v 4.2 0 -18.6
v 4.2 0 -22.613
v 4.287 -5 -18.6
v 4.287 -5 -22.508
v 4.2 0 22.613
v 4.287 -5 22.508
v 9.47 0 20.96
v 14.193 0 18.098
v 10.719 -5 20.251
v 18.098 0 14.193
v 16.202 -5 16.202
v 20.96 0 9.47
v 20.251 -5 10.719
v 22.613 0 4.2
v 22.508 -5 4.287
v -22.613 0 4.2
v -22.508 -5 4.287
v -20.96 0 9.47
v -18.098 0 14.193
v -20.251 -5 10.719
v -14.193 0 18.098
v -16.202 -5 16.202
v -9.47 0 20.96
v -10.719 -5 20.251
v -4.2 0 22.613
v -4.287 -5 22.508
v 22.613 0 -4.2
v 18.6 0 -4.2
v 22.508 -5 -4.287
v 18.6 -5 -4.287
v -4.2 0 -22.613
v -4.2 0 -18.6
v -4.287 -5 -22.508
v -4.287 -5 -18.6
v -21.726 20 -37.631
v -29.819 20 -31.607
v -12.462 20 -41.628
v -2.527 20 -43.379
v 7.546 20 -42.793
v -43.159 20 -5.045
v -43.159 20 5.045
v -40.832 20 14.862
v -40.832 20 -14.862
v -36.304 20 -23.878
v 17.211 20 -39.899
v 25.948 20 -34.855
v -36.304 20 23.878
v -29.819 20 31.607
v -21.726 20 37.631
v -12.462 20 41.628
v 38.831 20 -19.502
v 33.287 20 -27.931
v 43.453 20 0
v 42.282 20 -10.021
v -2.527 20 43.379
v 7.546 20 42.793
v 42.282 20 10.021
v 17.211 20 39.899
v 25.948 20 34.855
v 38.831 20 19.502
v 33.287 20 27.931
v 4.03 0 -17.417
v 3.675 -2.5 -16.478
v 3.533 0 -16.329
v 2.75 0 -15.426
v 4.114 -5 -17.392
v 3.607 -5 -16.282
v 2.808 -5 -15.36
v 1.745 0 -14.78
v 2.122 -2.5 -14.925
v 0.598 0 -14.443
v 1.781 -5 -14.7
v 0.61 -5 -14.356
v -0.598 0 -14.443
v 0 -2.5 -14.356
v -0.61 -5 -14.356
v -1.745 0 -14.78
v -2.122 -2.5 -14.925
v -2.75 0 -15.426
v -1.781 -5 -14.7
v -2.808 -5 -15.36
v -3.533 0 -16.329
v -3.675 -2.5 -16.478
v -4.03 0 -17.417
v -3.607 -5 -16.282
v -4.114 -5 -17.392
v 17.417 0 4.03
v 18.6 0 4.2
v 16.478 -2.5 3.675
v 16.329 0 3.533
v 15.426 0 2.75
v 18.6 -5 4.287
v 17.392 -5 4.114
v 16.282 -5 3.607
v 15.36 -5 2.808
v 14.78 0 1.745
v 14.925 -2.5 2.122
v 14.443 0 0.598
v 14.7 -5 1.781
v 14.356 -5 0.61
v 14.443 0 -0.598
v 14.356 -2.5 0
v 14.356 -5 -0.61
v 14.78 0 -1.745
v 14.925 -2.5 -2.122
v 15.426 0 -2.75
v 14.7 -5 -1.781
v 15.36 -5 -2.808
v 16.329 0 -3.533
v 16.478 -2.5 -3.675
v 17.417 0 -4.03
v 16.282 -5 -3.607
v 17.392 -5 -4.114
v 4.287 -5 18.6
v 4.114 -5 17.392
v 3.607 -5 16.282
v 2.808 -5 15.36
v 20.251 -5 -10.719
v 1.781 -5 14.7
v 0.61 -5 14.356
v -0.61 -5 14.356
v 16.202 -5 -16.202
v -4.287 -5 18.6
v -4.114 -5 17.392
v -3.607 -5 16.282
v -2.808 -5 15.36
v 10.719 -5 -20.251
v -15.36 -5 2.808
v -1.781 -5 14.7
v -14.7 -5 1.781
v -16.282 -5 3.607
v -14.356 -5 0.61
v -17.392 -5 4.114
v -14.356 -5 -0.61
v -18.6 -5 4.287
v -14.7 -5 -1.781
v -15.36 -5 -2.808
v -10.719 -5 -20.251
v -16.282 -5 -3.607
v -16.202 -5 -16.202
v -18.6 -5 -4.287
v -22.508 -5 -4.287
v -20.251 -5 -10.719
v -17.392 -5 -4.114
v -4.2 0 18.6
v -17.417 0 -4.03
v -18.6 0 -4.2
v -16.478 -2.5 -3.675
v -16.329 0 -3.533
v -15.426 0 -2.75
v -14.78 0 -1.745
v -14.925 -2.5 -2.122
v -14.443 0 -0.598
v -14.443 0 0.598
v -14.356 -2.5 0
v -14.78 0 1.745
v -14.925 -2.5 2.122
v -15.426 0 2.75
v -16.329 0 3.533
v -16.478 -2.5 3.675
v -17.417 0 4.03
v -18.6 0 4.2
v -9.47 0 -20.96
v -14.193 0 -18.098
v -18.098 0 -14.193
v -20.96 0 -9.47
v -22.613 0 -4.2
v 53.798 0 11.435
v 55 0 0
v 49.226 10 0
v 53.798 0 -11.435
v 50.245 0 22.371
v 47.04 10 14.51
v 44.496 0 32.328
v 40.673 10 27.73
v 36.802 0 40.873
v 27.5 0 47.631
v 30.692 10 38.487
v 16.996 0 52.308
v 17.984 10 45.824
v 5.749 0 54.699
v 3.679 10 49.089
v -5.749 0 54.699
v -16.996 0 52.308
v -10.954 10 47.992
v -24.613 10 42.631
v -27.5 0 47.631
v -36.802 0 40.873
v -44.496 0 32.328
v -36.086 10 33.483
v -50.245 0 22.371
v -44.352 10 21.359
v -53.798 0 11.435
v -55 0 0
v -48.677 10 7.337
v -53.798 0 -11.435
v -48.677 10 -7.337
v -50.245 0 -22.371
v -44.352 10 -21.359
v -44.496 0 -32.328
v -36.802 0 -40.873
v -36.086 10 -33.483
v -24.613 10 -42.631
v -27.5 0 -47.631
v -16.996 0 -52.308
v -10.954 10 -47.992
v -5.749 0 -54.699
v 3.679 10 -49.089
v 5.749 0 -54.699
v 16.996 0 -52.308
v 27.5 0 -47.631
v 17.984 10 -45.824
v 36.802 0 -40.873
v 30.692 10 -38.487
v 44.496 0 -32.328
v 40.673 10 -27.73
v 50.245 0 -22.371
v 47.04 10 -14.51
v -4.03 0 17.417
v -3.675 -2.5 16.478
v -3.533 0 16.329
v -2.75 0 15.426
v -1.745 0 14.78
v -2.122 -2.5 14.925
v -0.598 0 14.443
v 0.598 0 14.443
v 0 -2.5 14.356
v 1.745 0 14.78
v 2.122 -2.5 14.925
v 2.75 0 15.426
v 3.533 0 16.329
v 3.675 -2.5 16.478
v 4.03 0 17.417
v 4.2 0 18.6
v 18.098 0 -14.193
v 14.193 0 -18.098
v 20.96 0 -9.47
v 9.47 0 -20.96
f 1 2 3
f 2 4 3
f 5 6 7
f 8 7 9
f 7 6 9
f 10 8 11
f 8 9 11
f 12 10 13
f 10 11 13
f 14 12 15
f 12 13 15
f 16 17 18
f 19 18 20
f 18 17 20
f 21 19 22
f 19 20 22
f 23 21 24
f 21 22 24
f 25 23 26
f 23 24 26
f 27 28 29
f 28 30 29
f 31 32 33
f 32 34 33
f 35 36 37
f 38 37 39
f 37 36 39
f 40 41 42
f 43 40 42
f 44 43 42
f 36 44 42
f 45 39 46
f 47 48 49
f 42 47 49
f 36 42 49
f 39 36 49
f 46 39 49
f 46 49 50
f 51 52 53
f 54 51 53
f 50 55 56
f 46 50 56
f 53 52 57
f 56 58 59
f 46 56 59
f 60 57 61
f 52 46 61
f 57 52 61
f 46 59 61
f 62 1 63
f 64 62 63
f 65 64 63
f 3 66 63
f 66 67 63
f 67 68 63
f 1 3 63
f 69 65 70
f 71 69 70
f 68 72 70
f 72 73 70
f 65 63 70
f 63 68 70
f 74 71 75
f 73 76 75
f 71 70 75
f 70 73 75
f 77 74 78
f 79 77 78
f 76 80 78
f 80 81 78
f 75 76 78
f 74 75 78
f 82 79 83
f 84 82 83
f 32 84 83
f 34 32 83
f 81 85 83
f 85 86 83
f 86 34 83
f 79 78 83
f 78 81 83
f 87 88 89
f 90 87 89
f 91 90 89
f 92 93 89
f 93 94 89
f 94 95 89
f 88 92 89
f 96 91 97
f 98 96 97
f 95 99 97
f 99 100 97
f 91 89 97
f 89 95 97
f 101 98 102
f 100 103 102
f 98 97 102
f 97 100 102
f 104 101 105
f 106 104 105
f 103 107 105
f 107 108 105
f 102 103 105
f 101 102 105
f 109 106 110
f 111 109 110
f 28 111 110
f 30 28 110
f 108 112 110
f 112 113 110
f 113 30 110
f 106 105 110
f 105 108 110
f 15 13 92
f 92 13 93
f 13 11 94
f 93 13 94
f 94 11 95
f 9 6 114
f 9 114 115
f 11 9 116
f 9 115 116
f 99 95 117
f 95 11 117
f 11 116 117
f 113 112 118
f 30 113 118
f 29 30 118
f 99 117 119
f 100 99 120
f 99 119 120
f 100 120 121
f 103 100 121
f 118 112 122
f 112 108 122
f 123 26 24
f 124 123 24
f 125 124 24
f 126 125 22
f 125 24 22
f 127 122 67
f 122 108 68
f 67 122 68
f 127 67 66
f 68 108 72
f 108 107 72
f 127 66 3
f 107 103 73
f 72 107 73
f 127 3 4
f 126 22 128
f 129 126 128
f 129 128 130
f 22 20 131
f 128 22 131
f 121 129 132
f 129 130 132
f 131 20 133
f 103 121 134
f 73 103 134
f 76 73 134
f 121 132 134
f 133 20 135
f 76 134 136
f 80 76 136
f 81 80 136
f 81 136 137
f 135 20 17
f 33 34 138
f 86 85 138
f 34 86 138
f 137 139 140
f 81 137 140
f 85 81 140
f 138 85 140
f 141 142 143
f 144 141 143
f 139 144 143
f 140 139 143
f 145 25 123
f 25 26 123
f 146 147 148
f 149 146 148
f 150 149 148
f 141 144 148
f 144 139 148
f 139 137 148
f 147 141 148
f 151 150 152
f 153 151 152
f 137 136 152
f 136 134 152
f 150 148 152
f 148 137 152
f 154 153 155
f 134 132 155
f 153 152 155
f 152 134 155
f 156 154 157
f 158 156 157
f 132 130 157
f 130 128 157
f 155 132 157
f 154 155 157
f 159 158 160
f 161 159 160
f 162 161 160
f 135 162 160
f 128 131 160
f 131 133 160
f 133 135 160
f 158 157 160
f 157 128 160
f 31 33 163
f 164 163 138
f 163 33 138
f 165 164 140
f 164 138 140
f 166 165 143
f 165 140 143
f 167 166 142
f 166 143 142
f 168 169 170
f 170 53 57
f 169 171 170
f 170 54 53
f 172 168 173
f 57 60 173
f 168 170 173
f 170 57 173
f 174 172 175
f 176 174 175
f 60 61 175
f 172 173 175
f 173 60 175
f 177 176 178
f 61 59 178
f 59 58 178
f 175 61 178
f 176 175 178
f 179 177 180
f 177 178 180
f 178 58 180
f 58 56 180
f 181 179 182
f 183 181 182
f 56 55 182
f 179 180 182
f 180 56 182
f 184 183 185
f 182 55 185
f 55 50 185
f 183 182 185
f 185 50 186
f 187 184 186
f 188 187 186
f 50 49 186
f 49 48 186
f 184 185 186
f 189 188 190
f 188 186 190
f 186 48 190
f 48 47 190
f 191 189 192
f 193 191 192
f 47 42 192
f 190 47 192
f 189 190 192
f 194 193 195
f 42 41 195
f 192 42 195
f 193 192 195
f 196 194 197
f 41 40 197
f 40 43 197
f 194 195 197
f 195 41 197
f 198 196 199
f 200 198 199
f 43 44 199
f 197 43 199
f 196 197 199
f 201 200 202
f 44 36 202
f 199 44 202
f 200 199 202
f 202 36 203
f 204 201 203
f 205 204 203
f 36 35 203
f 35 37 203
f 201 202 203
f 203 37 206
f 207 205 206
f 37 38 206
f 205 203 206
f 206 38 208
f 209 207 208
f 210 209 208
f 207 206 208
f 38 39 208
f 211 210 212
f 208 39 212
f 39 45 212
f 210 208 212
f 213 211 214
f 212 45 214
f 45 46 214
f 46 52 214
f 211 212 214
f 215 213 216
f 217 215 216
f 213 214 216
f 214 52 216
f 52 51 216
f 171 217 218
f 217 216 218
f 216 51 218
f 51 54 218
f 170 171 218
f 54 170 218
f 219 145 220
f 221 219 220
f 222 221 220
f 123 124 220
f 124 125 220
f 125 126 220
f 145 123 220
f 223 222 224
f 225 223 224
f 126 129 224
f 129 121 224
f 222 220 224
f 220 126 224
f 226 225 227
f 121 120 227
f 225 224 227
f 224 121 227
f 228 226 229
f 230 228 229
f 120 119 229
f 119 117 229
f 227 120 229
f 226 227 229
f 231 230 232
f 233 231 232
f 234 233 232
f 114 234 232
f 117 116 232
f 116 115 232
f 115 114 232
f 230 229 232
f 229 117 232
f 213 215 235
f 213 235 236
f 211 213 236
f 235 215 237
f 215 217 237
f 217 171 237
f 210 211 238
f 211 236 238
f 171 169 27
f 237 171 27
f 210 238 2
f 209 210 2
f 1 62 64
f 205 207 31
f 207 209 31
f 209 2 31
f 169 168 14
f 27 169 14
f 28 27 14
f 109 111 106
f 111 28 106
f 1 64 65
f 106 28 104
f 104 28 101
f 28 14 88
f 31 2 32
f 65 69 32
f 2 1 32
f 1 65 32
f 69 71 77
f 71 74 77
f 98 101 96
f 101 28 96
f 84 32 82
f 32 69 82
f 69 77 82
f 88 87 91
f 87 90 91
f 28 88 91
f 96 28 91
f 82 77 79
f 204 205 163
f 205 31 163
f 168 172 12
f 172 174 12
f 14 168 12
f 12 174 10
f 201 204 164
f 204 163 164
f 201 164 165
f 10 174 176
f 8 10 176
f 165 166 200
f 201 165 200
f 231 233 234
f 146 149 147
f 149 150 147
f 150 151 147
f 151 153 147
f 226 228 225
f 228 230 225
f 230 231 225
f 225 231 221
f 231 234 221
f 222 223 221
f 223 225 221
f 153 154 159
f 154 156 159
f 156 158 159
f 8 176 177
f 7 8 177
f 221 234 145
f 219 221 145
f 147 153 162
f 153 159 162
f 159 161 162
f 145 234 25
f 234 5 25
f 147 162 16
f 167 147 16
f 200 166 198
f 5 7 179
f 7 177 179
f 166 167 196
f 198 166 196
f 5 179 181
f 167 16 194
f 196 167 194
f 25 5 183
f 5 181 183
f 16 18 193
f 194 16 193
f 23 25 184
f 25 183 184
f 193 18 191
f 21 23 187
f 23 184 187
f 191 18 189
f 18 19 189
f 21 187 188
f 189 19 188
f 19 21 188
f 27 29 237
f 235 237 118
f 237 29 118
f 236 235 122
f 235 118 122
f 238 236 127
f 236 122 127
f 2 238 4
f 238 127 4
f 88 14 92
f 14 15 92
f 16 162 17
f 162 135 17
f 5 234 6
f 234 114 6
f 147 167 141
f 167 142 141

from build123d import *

# Parameters (mm, degrees)
BOSS_EXTRUDE1_DEPTH = 5
BOSS_EXTRUDE1_TAPER = 1


with BuildPart() as part:
    # Sketch2 → Boss-Extrude1 (new body)
    with BuildSketch(Plane(origin=(0, 0, 0), x_dir=(1, 0, 0), z_dir=(0, 1, 0))):
        with BuildLine():
            Line((-4.2, 18.6), (-4.2, 22.61327044))
            ThreePointArc((-4.2, 22.61327044), (-16.263455967, 16.263455967), (-22.61327044, 4.2))
            Line((-22.61327044, 4.2), (-18.6, 4.2))
            ThreePointArc((-18.6, 4.2), (-14.4, 0), (-18.6, -4.2))
            Line((-18.6, -4.2), (-22.61327044, -4.2))
            ThreePointArc((-22.61327044, -4.2), (-16.263455967, -16.263455967), (-4.2, -22.61327044))
            Line((-4.2, -22.61327044), (-4.2, -18.6))
            ThreePointArc((-4.2, -18.6), (0, -14.4), (4.2, -18.6))
            Line((4.2, -18.6), (4.2, -22.61327044))
            ThreePointArc((4.2, -22.61327044), (16.263455967, -16.263455967), (22.61327044, -4.2))
            Line((22.61327044, -4.2), (18.6, -4.2))
            ThreePointArc((18.6, -4.2), (14.4, 0), (18.6, 4.2))
            Line((18.6, 4.2), (22.61327044, 4.2))
            ThreePointArc((22.61327044, 4.2), (16.263455967, 16.263455967), (4.2, 22.61327044))
            Line((4.2, 22.61327044), (4.2, 18.6))
            ThreePointArc((4.2, 18.6), (0, 14.4), (-4.2, 18.6))
        make_face()
    extrude(amount=-BOSS_EXTRUDE1_DEPTH, taper=BOSS_EXTRUDE1_TAPER)

    # Sketch4 → Revolve1 (revolve)
    with BuildSketch(Plane.XY):
        Polygon((0, 0), (55, 0), (43.452994616, 20), (0, 20), align=None)
    revolve(axis=Axis((0, 20, 0), (0, -1, 0)))


solid = part.part
